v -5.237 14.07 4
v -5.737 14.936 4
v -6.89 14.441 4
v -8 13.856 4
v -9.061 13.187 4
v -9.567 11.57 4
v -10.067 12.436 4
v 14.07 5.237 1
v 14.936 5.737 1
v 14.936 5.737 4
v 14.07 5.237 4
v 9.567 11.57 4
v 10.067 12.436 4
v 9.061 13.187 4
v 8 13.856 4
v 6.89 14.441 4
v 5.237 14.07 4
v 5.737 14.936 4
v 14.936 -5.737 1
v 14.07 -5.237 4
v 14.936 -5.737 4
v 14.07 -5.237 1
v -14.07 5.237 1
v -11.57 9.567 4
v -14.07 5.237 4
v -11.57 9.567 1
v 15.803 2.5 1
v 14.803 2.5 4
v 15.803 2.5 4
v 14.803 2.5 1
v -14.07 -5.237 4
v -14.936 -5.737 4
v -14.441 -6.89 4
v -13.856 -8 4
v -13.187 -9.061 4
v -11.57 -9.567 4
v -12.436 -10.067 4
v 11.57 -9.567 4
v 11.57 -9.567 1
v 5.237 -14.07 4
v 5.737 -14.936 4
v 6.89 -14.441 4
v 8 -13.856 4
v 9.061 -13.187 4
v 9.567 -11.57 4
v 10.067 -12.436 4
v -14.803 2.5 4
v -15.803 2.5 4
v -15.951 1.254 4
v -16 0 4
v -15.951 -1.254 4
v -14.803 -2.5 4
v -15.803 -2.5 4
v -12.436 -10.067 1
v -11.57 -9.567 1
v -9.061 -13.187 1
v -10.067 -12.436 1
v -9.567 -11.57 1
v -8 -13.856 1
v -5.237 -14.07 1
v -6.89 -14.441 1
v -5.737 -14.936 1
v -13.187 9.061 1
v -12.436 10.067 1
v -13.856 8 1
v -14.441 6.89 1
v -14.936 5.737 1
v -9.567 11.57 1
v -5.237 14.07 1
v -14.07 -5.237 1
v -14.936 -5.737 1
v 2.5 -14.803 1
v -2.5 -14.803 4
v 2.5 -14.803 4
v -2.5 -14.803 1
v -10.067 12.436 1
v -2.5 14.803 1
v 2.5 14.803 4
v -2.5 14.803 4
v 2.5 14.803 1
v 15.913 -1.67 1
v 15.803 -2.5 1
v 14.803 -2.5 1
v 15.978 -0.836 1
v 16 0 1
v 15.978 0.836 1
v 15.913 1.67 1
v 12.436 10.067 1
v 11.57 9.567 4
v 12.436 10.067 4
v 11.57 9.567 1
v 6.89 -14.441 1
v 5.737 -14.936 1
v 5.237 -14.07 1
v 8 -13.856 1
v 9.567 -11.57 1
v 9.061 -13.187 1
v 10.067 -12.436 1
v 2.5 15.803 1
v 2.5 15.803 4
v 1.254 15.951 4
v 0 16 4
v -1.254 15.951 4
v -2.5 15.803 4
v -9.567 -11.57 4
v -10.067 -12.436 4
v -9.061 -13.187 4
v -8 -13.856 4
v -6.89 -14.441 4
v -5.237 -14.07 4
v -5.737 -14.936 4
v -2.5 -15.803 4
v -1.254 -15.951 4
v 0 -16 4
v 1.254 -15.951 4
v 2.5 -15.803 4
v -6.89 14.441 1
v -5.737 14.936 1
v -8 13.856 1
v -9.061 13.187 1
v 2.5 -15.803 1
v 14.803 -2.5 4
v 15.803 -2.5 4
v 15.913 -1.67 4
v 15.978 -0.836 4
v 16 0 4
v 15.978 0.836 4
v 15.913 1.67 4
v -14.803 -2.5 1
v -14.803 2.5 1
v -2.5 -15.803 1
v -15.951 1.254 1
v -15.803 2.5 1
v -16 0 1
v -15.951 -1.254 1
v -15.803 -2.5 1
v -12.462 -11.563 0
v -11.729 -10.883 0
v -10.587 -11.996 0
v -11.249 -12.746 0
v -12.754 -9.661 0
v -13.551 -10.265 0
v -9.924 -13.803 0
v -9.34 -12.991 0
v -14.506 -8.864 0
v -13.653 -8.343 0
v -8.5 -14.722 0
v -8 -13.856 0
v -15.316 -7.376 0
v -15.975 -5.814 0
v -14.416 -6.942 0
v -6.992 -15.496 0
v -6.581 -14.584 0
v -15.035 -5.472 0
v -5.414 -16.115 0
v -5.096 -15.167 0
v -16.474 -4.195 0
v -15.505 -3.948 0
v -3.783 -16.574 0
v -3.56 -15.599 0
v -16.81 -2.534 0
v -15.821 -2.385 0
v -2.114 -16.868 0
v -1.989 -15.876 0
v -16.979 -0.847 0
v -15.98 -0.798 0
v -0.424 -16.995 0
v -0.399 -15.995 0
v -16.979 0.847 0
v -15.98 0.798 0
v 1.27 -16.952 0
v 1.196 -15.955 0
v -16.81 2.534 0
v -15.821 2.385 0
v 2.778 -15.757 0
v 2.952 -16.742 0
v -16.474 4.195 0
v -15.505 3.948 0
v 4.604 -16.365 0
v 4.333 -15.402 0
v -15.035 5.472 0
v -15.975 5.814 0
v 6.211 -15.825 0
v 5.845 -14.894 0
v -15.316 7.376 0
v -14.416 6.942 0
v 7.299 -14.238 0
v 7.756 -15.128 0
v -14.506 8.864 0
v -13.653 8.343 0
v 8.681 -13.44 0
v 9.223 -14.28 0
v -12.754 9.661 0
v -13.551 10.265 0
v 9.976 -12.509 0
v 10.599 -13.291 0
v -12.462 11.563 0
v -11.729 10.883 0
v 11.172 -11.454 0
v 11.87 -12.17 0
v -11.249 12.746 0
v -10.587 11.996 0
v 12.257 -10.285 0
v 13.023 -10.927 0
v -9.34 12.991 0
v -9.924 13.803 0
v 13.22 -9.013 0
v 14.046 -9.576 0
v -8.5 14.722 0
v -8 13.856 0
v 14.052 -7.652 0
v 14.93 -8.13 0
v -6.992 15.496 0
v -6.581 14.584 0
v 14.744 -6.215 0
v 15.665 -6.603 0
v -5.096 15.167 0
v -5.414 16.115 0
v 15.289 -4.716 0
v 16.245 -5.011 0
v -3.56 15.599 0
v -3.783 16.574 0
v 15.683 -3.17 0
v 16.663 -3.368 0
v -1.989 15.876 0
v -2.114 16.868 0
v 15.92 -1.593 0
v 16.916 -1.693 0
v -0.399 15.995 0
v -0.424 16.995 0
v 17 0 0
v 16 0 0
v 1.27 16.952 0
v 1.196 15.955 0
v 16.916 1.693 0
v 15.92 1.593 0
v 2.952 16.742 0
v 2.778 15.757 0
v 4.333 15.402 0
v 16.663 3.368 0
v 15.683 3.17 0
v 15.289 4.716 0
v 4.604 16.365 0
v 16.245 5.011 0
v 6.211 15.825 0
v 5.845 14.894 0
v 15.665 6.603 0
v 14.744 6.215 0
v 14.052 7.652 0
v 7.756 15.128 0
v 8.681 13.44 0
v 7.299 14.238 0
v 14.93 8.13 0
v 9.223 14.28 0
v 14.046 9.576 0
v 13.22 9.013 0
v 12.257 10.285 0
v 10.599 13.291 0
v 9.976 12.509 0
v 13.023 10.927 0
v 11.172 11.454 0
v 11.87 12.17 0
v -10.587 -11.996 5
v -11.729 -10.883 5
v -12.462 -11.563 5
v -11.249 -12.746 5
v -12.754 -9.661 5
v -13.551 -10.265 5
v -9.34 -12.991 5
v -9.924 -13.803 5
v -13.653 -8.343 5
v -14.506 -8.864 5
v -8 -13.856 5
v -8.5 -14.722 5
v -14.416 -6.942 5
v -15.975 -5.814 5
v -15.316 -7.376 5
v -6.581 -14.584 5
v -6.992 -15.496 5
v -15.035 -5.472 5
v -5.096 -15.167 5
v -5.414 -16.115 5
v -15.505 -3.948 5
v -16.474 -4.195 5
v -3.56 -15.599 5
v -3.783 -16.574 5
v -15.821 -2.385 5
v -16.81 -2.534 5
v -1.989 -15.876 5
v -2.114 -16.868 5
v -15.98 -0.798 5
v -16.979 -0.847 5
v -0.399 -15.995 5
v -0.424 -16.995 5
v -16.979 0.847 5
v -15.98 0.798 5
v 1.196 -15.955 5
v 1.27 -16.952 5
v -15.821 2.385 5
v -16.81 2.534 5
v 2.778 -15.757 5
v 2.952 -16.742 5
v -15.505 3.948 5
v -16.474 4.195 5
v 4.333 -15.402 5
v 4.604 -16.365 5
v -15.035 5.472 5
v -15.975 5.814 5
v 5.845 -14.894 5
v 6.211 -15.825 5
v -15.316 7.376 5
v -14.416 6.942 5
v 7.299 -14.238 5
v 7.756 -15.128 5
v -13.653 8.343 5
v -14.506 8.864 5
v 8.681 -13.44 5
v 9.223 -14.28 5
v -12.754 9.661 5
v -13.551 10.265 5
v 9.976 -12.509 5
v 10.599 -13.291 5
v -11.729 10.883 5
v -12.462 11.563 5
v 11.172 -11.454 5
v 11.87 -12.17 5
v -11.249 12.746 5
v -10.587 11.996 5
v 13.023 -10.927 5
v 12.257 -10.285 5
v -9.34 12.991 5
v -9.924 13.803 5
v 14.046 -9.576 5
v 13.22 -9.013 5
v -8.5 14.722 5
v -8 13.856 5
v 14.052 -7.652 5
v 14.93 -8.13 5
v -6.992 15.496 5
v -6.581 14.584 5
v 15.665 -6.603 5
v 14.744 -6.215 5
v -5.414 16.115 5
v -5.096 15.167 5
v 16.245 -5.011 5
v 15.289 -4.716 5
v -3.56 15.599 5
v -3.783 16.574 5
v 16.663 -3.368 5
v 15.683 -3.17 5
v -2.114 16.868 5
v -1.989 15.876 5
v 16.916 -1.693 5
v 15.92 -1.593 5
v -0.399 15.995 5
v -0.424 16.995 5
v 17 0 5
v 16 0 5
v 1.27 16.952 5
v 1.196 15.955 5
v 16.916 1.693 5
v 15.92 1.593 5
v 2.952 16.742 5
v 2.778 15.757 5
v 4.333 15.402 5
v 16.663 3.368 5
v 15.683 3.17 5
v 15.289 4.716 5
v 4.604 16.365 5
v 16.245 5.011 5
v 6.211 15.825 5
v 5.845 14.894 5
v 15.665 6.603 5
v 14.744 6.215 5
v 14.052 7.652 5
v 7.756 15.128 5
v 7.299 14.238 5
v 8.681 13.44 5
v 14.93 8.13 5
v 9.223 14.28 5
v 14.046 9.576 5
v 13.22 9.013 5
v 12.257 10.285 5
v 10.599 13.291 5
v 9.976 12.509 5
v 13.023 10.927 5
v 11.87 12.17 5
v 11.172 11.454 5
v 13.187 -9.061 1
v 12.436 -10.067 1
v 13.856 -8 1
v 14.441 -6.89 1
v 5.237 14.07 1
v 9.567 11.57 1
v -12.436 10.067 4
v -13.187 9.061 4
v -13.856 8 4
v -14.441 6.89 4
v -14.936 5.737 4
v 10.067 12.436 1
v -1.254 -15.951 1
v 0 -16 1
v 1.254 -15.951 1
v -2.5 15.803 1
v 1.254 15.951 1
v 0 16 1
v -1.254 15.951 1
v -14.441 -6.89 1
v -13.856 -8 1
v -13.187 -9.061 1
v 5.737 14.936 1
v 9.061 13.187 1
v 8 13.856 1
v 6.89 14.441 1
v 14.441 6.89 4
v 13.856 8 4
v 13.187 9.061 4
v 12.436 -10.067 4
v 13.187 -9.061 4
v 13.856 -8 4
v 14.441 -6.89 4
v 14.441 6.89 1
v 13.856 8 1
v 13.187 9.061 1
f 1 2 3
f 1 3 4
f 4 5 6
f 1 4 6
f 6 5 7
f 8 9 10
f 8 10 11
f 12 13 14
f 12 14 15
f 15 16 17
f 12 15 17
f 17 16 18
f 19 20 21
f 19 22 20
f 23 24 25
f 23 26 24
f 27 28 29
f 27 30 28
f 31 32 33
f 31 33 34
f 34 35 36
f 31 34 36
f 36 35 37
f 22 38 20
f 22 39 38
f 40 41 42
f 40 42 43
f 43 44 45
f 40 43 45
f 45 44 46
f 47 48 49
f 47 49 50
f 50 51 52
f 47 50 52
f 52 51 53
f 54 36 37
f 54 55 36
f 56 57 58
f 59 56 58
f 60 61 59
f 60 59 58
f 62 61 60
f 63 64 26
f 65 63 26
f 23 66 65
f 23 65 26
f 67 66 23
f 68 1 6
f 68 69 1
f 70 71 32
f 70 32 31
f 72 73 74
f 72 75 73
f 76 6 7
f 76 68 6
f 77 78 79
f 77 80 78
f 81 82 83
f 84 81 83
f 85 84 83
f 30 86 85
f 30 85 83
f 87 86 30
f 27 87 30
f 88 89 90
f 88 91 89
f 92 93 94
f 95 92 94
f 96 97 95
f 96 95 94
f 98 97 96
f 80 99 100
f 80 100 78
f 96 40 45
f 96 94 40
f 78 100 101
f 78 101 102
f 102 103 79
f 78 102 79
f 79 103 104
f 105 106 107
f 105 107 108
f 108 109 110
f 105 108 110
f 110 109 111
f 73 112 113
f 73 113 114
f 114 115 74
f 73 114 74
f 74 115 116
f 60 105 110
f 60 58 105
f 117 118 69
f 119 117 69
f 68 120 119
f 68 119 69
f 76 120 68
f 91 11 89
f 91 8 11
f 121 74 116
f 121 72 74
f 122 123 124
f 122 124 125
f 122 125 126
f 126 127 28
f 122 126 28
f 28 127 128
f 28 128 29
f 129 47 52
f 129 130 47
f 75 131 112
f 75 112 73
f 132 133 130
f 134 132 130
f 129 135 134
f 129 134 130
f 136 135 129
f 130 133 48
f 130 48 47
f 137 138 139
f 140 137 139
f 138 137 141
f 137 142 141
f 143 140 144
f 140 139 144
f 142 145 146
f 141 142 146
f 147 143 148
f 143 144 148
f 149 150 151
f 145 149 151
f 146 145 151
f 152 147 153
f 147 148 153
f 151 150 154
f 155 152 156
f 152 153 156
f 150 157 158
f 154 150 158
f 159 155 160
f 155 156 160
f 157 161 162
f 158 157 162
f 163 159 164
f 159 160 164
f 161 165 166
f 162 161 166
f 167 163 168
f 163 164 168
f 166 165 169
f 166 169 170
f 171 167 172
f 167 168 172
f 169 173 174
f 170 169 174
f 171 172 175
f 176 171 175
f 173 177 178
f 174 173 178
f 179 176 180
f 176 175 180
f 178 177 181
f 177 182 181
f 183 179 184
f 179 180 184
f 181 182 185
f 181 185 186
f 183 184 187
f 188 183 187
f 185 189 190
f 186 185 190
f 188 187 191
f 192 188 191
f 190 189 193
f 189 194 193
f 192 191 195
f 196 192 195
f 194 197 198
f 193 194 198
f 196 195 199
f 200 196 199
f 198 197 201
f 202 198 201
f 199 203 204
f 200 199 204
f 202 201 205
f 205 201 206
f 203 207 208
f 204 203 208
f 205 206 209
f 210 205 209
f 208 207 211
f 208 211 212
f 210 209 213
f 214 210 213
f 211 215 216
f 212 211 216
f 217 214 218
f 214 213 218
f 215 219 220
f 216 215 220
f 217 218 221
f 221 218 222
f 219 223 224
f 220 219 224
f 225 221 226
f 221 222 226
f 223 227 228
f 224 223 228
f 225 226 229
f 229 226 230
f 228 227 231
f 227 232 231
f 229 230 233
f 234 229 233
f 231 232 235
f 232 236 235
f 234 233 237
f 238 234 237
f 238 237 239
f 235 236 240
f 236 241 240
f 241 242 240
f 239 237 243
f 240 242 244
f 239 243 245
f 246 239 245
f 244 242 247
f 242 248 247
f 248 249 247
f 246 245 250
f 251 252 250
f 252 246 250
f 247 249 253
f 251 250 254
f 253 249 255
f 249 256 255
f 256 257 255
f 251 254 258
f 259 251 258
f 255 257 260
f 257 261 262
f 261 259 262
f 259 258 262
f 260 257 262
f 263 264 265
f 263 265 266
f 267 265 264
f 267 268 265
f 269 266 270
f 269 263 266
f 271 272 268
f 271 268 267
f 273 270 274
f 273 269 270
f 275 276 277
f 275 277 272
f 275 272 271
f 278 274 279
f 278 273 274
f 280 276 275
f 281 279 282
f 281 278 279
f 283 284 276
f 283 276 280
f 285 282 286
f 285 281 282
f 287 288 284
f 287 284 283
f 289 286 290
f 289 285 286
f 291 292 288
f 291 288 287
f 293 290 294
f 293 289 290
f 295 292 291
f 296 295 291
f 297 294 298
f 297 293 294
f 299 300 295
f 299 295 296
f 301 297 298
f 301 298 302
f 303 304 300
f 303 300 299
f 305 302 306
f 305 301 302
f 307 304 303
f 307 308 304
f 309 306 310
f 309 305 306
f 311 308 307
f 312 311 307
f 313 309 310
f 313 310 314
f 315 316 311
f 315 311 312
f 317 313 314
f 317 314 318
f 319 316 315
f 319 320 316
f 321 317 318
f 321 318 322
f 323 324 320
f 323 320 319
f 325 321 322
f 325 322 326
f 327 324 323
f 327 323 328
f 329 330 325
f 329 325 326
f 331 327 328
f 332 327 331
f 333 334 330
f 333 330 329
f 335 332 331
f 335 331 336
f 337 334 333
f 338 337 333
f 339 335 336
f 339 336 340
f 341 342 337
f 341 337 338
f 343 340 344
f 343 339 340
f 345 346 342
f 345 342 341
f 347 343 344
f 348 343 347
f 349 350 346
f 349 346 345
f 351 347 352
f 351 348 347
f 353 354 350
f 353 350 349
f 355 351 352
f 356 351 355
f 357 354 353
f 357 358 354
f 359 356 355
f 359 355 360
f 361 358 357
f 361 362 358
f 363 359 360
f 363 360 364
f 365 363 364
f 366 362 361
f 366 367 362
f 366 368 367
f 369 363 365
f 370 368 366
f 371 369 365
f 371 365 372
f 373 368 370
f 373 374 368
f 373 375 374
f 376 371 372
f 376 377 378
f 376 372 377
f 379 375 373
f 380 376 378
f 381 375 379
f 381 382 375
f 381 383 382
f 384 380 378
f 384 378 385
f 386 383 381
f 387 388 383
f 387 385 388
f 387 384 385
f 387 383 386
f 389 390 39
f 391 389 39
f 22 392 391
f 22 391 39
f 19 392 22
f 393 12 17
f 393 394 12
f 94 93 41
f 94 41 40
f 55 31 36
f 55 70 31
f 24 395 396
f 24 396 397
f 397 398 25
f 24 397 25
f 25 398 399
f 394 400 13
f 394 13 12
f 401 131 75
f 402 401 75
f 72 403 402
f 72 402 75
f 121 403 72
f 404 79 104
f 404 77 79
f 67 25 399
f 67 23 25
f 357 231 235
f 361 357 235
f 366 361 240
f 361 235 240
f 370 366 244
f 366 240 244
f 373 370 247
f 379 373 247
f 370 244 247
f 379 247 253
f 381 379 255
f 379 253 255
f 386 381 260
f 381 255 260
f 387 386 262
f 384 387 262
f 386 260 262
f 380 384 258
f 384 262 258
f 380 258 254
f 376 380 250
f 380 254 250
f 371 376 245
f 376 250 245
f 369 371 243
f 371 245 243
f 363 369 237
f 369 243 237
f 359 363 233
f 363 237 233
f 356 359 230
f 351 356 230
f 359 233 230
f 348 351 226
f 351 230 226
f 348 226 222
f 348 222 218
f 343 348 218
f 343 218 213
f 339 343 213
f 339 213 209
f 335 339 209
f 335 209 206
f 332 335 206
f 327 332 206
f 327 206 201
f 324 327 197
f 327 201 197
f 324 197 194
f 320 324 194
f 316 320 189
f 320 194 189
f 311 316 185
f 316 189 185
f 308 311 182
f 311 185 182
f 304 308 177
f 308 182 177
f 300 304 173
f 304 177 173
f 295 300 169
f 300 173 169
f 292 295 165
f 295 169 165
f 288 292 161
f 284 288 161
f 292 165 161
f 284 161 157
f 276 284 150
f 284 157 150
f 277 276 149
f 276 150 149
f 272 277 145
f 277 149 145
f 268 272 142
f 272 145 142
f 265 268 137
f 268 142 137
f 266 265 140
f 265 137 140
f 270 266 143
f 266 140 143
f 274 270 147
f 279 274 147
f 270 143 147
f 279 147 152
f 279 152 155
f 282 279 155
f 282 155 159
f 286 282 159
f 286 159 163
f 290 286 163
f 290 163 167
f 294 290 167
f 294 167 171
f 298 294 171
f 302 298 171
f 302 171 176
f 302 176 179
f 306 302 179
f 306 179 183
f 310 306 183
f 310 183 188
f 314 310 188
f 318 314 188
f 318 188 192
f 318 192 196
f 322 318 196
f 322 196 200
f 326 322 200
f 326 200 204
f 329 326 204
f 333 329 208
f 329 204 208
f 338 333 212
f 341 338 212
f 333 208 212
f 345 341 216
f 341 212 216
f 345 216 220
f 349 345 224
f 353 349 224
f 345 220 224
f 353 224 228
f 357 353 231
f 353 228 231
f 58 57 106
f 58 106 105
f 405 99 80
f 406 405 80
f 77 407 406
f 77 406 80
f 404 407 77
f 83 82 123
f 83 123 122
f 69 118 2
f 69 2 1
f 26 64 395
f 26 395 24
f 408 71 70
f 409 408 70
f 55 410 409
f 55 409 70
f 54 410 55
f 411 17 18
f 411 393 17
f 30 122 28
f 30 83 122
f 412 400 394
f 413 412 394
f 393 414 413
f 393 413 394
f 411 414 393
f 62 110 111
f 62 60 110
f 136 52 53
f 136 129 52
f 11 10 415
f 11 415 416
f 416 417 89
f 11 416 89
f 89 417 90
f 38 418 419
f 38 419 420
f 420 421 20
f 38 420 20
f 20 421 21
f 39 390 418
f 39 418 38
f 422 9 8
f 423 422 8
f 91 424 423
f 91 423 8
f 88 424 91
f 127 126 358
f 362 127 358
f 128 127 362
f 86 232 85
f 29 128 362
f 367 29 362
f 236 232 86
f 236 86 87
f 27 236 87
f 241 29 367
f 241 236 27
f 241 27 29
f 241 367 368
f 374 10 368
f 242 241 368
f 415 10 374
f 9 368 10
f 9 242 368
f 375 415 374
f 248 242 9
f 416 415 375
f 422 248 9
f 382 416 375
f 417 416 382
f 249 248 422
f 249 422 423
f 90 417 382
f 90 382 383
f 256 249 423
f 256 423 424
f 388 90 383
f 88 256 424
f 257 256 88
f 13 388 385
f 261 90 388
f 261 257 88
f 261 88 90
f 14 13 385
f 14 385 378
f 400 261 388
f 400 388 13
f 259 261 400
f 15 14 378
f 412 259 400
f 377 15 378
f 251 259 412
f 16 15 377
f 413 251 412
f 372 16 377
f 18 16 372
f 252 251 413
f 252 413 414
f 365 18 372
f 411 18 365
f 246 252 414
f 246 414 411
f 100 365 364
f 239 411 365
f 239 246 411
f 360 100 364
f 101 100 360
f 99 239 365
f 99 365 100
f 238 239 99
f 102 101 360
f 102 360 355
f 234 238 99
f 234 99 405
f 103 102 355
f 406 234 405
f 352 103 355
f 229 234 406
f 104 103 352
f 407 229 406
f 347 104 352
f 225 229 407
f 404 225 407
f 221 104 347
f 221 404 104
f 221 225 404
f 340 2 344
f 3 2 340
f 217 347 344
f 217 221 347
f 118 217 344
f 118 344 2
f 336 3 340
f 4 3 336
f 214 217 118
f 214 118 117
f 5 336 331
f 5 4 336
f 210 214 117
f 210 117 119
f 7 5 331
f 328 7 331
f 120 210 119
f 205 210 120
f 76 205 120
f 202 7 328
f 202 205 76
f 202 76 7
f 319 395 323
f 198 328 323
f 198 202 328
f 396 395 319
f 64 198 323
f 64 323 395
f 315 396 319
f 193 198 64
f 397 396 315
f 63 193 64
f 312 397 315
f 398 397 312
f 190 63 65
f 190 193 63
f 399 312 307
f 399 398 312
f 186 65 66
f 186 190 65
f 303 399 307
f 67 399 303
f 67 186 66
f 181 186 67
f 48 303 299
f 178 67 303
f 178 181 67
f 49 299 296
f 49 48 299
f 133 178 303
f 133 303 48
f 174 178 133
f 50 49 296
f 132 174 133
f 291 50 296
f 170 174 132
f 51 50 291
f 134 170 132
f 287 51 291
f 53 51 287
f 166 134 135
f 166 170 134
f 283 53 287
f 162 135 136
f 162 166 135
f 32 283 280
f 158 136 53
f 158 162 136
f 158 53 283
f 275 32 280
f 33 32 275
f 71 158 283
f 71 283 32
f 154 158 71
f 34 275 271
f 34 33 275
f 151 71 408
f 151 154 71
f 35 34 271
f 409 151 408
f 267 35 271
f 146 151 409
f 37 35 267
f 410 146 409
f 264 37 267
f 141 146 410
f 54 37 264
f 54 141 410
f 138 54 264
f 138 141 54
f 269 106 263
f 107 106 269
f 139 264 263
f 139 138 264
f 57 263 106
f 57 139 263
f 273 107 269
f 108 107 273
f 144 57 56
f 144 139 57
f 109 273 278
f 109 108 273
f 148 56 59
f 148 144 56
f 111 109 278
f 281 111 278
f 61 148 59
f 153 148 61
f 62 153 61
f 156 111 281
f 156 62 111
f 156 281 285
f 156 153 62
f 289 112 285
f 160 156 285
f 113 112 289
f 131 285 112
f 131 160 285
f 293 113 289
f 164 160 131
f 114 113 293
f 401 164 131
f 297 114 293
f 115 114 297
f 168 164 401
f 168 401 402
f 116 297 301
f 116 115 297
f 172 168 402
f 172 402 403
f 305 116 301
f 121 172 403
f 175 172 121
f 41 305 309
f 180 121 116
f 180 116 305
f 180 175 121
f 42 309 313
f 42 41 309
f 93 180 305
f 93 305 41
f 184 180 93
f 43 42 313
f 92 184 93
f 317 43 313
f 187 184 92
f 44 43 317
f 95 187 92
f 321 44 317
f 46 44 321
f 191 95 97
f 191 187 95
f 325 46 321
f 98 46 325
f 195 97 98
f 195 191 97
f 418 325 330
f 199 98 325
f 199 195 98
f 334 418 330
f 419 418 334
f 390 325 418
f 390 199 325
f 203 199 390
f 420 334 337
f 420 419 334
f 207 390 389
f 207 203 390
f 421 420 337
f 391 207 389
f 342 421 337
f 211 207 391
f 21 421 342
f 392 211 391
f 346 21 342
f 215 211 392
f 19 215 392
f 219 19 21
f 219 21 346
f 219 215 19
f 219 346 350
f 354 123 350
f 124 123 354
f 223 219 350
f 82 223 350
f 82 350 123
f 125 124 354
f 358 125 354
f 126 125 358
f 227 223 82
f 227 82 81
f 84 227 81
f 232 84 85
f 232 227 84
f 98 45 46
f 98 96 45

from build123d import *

# Parameters (mm, degrees)
SKETCH15_R          = 17
SKETCH15_R_2        = 16
BOSS_EXTRUDE1_DEPTH = 5
BOSS_EXTRUDE2_DEPTH = 1.5
CIRPATTERN1_COUNT   = 12


with BuildPart() as part:
    # Sketch15 → Boss-Extrude1 (new body)
    with BuildSketch(Plane.XY):
        Circle(SKETCH15_R)
        Circle(SKETCH15_R_2, mode=Mode.SUBTRACT)
    extrude(amount=BOSS_EXTRUDE1_DEPTH)

    # Sketch16 → Boss-Extrude2 (add, symmetric)
    with BuildSketch(Plane(origin=(0, 0, 2.5), x_dir=(-1, 0, 0), z_dir=(0, 0, -1))):
        with BuildLine():
            Line((2.5, 14.803480629), (2.5, 15.803480629))
            ThreePointArc((2.5, 15.803480629), (0, 16), (-2.5, 15.803480629))
            Line((-2.5, 15.803480629), (-2.5, 14.803480629))
            Line((-2.5, 14.803480629), (2.5, 14.803480629))
        make_face()
    boss_extrude2 = extrude(amount=BOSS_EXTRUDE2_DEPTH, both=True)

    # CirPattern1: Boss-Extrude2 ×12 about axis
    cirpattern1_axis = Axis((0, 0, 0), (0, 0, 1))
    for i in range(1, CIRPATTERN1_COUNT):
        add(boss_extrude2.rotate(cirpattern1_axis, i * 360 / CIRPATTERN1_COUNT))


solid = part.part
